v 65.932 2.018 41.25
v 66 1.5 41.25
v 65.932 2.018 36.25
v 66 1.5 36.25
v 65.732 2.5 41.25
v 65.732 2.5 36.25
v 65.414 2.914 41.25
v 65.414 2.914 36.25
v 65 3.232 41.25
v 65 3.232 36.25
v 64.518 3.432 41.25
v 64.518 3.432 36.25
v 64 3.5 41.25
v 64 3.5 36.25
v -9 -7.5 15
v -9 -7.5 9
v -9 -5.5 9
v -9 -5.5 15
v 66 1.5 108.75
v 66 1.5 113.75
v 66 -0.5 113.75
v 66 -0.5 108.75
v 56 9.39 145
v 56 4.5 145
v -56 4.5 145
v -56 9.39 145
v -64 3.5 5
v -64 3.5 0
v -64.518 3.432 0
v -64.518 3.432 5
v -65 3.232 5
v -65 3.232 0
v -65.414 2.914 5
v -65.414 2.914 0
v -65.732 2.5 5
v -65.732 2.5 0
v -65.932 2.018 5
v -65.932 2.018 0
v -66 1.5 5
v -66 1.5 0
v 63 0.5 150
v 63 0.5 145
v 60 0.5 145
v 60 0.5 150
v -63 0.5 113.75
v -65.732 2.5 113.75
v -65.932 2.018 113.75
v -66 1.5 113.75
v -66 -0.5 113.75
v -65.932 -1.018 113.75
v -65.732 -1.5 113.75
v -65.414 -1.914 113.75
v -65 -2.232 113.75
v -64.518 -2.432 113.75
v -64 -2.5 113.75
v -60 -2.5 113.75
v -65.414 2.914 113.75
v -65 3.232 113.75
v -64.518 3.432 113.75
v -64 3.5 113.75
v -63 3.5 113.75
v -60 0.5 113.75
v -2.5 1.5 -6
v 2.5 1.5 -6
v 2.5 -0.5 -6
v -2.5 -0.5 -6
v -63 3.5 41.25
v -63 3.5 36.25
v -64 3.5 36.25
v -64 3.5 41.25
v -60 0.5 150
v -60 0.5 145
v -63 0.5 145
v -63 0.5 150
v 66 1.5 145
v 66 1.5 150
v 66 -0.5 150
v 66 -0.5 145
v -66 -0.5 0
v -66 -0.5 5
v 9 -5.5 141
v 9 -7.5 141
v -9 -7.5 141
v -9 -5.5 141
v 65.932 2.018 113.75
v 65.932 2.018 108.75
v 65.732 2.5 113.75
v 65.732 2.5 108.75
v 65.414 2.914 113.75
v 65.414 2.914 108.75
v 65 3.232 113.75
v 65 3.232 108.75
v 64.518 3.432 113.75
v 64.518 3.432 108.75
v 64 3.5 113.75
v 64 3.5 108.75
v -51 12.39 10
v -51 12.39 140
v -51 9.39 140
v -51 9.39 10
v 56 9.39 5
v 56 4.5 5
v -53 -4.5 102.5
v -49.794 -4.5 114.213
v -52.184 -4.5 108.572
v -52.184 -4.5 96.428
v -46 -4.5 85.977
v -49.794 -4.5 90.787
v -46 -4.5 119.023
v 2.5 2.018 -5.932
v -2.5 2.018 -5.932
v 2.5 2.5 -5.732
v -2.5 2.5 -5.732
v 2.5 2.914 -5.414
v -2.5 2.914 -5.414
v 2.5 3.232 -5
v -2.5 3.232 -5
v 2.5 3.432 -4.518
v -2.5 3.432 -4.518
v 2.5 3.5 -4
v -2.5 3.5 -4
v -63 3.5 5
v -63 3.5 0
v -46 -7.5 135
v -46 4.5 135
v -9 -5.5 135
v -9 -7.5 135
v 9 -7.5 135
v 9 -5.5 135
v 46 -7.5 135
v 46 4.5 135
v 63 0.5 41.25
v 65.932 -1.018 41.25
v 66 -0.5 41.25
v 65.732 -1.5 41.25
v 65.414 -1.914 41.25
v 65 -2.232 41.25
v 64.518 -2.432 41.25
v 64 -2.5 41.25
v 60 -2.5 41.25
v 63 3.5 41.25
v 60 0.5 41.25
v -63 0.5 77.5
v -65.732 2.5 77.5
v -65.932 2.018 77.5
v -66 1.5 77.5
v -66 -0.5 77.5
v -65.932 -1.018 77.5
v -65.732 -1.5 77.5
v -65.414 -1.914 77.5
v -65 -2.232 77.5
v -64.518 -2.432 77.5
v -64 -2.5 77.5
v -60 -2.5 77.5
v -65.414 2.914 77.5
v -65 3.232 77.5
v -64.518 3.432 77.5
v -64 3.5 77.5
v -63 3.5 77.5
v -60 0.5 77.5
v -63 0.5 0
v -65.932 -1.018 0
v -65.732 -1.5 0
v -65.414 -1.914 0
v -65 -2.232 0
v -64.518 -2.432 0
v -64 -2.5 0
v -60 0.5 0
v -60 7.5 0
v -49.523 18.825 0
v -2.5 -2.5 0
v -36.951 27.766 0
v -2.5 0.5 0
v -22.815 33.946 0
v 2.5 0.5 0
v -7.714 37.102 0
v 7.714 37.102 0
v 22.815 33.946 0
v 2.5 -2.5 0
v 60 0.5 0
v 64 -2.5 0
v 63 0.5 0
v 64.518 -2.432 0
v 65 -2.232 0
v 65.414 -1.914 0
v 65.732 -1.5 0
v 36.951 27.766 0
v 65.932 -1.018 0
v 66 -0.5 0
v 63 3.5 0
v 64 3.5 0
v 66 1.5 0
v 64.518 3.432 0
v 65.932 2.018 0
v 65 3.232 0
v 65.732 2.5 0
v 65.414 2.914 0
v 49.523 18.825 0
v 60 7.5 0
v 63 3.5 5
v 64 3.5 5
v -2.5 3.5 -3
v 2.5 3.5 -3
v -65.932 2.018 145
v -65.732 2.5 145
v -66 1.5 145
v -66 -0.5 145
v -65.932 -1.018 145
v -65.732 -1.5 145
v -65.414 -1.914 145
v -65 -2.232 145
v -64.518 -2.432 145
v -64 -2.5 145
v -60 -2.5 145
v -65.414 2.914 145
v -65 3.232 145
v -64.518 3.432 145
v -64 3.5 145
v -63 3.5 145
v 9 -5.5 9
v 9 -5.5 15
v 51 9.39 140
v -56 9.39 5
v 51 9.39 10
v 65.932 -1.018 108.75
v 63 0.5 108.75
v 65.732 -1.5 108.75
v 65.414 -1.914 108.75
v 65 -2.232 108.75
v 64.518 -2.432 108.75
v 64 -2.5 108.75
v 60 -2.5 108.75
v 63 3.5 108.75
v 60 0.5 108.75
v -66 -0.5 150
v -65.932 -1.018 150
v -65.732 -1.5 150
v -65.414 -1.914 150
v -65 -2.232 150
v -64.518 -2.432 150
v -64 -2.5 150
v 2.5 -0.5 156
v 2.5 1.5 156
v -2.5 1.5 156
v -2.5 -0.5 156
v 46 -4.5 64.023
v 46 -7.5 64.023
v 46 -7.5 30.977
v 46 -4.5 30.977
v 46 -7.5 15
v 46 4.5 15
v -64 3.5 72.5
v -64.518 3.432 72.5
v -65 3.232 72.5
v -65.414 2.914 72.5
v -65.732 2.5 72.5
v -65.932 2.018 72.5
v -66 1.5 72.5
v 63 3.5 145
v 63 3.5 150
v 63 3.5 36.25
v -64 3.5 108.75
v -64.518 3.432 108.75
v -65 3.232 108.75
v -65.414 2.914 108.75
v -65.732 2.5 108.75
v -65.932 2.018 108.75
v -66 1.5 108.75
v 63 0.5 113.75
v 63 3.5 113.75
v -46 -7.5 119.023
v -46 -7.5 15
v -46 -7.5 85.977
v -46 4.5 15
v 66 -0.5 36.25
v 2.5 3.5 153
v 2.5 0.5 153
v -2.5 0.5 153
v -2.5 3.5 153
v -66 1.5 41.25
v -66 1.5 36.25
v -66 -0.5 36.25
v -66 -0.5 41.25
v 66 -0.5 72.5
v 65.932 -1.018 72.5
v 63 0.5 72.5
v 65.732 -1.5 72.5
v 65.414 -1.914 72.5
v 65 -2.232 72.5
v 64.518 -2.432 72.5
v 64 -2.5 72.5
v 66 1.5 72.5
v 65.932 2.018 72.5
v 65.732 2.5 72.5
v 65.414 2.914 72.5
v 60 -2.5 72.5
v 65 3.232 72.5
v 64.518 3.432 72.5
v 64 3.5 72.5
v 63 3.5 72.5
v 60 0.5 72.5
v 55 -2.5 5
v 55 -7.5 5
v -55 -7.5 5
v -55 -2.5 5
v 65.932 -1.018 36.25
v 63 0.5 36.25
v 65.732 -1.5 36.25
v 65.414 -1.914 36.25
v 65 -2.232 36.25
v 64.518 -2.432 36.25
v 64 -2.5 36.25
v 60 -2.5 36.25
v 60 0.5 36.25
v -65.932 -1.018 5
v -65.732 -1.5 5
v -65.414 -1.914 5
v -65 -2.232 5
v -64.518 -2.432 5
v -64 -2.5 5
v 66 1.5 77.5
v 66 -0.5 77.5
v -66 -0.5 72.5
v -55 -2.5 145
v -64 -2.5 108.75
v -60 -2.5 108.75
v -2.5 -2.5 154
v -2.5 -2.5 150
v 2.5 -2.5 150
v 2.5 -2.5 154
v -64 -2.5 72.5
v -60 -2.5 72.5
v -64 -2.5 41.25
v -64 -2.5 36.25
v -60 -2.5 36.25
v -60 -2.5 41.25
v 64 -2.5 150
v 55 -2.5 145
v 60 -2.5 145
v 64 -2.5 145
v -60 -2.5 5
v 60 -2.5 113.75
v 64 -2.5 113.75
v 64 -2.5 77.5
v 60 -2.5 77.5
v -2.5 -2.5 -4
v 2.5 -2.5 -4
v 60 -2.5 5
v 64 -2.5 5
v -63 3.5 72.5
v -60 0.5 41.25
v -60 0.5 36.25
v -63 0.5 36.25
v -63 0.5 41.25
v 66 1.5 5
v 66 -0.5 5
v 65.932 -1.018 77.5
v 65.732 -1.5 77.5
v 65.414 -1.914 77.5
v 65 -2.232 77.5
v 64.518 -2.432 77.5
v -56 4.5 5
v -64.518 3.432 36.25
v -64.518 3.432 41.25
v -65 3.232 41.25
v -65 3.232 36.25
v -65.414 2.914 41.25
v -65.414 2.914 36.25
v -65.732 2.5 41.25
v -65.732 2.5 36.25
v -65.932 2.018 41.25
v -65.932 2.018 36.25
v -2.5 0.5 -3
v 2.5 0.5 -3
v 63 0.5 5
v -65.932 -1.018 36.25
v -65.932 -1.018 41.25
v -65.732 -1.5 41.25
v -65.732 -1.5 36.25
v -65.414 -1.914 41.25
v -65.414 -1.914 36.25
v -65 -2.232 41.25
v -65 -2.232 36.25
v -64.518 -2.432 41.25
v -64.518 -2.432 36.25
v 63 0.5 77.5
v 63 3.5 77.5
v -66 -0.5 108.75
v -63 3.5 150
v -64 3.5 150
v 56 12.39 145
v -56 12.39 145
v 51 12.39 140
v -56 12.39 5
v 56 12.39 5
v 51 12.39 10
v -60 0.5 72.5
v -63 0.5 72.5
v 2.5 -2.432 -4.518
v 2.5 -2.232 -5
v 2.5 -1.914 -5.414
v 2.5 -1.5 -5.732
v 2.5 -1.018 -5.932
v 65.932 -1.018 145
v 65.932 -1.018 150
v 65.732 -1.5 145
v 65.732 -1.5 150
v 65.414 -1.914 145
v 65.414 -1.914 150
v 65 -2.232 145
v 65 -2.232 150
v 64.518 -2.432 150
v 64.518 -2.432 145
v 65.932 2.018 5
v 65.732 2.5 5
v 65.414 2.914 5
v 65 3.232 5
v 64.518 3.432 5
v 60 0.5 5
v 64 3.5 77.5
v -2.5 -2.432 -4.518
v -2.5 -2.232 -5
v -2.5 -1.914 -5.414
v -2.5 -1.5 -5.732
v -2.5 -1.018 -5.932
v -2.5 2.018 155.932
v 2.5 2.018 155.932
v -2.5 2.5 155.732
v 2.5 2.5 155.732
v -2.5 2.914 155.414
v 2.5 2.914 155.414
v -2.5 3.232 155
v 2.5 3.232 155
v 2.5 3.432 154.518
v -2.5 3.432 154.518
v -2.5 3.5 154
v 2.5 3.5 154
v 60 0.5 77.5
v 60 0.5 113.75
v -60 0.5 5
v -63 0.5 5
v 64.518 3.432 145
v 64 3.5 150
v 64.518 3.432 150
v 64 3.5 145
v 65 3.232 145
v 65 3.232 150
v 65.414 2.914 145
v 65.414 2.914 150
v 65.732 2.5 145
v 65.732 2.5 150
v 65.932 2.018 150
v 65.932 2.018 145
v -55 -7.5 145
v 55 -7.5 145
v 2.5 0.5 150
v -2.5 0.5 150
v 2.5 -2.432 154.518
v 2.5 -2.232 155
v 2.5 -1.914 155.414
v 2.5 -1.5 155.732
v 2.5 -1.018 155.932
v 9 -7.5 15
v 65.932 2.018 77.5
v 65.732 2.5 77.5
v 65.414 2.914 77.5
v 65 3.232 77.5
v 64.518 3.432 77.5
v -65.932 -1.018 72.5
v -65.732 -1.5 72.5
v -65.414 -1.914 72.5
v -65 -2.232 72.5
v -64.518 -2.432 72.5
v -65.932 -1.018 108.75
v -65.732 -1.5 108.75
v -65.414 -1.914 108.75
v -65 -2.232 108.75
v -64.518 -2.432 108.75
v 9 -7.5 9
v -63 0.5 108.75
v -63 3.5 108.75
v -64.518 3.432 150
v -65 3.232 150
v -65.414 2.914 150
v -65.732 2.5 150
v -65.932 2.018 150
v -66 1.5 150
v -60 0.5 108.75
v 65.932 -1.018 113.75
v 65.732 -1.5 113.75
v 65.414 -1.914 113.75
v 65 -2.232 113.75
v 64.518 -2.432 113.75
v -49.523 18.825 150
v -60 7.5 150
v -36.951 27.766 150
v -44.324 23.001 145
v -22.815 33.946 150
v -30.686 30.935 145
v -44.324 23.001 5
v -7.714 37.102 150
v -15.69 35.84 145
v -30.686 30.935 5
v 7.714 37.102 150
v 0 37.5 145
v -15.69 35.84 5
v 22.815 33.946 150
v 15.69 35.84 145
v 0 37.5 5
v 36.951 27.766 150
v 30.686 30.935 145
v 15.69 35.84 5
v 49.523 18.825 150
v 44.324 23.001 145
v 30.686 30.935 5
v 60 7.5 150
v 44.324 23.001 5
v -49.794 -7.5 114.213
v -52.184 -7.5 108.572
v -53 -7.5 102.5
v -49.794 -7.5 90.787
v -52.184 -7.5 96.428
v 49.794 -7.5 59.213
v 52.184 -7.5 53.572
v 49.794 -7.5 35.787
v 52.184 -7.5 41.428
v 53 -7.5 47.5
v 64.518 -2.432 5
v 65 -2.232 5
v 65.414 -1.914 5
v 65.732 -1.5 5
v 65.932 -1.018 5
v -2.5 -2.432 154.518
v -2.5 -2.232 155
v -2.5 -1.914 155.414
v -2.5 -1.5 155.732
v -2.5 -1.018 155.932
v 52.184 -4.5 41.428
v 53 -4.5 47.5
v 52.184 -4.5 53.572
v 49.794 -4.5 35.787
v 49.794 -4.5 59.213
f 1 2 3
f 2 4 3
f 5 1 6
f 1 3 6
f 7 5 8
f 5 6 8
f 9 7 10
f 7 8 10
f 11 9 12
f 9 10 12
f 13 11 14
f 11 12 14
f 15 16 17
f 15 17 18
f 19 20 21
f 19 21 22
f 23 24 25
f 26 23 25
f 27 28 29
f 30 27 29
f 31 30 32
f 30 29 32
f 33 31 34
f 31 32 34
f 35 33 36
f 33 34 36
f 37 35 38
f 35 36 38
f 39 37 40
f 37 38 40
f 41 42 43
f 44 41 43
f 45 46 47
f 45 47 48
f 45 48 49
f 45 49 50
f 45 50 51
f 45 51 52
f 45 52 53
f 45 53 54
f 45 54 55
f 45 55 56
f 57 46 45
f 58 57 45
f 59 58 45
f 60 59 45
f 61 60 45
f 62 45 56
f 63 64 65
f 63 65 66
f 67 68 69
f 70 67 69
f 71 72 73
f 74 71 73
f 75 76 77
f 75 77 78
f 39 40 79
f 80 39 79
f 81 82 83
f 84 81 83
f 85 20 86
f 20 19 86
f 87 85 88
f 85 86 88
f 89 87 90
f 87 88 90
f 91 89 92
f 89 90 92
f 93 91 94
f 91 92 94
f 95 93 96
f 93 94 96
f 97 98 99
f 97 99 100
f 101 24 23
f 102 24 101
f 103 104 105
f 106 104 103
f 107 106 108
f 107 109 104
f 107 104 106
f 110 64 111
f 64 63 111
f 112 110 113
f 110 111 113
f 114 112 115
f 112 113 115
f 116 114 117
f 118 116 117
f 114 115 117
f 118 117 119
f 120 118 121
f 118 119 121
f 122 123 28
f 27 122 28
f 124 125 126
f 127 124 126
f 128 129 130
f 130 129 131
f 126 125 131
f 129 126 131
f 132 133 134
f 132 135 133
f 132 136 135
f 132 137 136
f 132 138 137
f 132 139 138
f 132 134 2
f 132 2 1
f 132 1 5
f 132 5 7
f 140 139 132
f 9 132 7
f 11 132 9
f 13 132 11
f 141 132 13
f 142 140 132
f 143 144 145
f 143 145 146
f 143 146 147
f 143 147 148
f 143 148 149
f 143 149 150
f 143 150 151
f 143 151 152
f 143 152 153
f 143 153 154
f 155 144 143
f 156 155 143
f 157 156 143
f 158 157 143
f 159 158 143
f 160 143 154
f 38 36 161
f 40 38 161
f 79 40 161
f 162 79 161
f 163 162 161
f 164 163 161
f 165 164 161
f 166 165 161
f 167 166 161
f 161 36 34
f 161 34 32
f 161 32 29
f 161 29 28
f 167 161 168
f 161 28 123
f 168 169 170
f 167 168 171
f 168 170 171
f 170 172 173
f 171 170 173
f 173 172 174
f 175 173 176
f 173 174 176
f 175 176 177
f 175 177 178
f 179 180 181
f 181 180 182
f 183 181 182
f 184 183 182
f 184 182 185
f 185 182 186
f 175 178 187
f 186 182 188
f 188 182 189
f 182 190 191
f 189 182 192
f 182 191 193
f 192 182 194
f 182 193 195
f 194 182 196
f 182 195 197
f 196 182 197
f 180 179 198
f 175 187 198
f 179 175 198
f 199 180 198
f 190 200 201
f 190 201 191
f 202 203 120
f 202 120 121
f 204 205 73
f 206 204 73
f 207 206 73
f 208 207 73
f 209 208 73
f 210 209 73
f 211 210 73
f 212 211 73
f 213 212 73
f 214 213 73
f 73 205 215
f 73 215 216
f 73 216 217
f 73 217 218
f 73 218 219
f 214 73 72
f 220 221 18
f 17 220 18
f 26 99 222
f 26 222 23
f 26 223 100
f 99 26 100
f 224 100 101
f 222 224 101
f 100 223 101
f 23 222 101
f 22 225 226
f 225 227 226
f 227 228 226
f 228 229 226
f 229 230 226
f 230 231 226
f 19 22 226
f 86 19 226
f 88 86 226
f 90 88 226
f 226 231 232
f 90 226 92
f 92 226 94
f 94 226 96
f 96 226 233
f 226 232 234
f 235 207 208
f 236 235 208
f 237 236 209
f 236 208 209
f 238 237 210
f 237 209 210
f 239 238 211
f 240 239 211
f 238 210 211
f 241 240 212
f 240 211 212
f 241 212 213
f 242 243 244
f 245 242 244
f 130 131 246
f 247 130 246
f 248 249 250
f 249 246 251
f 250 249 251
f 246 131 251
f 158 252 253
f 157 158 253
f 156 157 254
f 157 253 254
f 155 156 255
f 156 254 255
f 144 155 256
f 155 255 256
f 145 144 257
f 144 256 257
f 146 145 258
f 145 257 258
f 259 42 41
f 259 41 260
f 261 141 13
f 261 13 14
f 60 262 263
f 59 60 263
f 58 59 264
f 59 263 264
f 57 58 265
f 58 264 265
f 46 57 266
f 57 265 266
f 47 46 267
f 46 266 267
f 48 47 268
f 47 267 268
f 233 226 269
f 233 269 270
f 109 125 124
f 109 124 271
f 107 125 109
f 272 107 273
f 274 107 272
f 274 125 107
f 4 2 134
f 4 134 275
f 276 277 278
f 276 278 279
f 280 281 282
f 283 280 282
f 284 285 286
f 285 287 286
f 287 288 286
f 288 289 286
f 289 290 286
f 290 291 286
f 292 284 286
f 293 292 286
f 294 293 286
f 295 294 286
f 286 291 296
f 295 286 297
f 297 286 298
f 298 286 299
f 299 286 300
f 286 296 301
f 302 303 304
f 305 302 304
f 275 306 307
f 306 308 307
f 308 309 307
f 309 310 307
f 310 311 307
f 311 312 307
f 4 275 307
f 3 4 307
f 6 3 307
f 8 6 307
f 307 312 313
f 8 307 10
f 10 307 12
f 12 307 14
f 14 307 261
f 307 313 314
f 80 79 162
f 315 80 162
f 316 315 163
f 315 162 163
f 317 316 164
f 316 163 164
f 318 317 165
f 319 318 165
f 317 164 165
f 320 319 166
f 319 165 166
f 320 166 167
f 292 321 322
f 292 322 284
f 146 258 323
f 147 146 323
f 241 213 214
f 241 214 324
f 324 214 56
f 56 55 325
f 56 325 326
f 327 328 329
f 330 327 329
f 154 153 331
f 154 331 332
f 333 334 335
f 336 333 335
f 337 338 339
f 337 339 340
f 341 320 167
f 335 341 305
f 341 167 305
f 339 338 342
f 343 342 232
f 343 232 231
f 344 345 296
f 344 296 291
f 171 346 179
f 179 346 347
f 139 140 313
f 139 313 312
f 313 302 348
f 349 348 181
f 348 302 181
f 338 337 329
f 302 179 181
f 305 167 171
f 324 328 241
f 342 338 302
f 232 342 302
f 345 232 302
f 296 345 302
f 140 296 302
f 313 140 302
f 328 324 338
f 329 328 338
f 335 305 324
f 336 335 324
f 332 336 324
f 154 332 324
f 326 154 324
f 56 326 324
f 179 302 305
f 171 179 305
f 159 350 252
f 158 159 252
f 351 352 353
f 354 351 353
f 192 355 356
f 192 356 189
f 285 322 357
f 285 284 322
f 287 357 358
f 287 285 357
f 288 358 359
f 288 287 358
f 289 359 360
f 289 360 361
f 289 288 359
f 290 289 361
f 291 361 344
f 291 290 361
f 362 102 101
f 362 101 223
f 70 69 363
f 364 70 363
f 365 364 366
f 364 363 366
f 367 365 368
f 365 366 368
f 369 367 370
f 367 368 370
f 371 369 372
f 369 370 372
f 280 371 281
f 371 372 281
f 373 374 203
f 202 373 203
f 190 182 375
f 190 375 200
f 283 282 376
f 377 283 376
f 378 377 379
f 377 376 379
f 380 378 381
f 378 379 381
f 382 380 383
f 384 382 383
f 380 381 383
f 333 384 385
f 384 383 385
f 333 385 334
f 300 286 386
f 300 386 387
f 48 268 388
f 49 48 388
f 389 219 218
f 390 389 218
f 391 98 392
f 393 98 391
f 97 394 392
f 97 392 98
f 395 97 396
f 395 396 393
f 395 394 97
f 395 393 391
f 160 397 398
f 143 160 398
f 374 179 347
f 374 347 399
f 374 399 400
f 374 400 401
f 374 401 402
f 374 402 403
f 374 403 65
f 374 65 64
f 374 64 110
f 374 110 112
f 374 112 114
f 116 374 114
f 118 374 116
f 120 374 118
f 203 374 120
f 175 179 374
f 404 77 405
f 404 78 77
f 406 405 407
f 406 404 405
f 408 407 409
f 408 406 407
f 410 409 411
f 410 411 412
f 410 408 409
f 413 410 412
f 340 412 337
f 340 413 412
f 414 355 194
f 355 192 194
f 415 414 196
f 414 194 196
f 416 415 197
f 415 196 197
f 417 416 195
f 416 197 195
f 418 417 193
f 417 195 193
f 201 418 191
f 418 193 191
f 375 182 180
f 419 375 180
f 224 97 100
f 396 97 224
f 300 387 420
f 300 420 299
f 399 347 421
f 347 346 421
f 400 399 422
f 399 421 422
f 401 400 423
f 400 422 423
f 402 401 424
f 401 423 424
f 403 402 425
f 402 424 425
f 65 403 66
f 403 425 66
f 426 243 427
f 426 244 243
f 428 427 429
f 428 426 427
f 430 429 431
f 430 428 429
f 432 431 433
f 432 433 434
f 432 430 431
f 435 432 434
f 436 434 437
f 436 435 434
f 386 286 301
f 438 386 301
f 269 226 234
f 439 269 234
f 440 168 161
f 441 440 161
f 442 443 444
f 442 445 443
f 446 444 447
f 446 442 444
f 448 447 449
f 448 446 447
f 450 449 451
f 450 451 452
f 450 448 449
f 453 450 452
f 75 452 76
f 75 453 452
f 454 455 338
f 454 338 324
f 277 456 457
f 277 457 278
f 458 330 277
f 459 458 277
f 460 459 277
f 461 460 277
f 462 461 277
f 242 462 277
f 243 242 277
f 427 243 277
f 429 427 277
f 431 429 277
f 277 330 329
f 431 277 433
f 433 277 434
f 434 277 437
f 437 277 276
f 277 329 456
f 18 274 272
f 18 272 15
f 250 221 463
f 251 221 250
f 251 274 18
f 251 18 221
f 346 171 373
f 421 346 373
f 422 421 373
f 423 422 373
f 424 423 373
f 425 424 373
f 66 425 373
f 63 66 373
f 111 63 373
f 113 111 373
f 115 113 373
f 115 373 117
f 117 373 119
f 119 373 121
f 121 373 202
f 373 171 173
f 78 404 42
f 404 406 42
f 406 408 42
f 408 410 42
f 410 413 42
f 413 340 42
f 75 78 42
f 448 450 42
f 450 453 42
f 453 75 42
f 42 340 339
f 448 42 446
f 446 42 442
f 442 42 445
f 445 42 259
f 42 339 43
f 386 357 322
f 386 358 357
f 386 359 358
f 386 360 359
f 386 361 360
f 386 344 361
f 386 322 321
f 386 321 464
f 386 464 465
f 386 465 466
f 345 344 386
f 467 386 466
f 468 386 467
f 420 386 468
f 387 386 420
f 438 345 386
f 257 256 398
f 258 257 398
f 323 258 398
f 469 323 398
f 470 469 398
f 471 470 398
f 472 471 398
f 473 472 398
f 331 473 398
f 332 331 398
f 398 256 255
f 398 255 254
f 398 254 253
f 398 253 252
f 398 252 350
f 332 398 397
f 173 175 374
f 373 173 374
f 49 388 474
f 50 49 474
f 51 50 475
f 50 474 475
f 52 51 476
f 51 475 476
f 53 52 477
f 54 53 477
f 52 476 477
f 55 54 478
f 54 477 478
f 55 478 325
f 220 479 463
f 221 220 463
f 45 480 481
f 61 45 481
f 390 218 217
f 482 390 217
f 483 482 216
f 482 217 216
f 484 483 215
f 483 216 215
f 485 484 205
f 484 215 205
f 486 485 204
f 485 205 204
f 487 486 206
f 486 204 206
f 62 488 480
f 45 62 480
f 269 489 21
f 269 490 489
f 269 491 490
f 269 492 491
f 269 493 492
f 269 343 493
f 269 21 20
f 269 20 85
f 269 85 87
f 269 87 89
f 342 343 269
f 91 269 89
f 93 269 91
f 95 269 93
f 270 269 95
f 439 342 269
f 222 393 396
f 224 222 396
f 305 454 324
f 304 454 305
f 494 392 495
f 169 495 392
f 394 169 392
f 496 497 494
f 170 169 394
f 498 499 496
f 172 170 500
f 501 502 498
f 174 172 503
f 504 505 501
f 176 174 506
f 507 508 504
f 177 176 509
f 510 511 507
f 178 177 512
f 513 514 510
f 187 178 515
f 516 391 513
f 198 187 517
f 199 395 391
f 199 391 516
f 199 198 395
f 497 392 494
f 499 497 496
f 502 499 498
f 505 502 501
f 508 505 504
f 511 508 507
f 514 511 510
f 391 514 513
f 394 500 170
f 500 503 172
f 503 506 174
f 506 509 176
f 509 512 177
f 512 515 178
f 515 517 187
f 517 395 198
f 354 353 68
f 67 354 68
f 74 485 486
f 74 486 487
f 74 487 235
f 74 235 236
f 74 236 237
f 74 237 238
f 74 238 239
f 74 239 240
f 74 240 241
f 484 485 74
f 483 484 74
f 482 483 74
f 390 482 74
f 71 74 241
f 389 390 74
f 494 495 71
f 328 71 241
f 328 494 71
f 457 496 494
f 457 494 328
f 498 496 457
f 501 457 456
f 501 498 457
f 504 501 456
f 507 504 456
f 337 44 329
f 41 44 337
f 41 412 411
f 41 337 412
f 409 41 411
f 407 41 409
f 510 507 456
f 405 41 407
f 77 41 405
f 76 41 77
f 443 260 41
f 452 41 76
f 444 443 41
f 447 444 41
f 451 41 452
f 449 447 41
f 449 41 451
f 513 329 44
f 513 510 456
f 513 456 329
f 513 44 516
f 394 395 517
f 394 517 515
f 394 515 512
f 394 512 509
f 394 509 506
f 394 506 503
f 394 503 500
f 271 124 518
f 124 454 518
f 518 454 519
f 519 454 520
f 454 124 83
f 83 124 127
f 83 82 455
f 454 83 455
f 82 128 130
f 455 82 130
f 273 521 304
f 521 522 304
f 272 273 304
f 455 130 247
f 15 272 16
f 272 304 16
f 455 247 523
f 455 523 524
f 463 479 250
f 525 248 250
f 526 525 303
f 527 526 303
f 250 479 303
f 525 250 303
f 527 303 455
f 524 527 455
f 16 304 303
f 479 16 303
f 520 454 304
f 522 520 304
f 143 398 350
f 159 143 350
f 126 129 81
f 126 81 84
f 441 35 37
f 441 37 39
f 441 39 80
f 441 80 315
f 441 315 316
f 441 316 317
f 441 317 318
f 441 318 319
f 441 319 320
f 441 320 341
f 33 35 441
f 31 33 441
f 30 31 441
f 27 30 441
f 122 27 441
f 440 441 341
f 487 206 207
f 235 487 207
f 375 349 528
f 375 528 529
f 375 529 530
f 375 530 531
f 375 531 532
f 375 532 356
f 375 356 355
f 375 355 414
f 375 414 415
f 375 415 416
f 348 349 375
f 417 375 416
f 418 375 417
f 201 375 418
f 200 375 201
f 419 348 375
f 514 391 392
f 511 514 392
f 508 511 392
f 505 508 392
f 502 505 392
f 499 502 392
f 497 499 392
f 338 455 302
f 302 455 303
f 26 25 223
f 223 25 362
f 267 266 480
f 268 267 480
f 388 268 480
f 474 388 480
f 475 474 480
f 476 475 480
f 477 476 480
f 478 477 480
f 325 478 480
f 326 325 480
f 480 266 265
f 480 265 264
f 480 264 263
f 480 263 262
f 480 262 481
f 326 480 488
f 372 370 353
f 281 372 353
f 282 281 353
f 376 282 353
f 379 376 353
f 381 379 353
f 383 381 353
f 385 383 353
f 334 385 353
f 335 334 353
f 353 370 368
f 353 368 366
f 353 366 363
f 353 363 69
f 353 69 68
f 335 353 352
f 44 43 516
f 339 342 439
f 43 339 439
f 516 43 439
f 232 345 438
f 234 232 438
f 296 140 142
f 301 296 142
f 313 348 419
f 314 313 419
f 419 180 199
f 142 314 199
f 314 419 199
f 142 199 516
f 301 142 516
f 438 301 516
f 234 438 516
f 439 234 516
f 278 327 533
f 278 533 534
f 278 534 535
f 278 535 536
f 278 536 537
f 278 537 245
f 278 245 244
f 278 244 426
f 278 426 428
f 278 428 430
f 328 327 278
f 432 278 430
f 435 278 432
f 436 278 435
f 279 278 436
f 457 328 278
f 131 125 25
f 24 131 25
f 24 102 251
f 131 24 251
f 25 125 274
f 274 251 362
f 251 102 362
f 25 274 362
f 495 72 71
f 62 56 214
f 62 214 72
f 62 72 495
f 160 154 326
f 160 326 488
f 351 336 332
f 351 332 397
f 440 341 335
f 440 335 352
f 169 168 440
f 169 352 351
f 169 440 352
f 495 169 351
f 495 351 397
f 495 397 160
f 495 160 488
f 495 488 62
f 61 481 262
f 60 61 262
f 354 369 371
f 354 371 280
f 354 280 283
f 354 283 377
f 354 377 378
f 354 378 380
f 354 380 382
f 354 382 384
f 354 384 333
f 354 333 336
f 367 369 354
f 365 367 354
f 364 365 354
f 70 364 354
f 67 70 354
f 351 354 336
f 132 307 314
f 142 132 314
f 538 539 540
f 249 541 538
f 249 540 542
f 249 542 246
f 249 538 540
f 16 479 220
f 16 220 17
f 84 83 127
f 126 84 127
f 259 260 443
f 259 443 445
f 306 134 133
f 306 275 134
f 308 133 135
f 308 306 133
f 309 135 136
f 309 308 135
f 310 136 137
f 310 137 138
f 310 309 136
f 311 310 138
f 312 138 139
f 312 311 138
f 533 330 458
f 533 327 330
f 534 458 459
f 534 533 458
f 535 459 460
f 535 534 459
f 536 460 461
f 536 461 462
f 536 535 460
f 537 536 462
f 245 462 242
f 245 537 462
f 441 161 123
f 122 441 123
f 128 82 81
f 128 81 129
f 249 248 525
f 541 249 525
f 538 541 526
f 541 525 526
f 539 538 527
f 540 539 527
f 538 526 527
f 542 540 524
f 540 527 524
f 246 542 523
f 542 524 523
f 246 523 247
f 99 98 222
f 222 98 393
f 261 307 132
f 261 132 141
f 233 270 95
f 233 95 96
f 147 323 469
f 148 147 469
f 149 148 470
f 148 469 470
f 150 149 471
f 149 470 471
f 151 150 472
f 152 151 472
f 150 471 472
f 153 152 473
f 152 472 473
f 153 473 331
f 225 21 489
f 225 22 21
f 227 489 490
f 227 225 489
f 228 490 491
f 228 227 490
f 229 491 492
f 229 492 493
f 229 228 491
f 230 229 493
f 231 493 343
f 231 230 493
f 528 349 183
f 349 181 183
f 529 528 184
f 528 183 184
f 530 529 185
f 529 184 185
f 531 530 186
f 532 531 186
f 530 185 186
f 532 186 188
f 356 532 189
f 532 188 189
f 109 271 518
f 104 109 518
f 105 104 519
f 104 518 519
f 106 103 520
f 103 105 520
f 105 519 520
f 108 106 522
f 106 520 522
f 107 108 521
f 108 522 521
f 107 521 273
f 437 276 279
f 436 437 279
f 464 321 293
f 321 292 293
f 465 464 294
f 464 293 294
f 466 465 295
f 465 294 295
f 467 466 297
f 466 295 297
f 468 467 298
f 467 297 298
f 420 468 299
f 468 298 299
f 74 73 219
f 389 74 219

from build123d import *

# Parameters (mm, degrees)
SKETCH2_W              = 120
SKETCH2_H              = 15
BOSS_EXTRUDE1_DEPTH    = 150
BOSS_EXTRUDE3_DEPTH    = 150
SKETCH7_W              = 112
SKETCH7_H              = 140
CUT_EXTRUDE1_DEPTH     = 165.890873004
SKETCH8_W              = 92
SKETCH8_H              = 120
CUT_EXTRUDE2_DEPTH     = 165.890873004
SKETCH12_OUTSIDE_W     = 161.458
SKETCH12_OUTSIDE_H     = 191.458
SKETCH12_OUTSIDE_W_2   = 110
SKETCH12_OUTSIDE_H_2   = 140
CUT_EXTRUDE5_DEPTH     = 5
BOSS_EXTRUDE4_REACH    = 163.342
SKETCH14_W             = 112
SKETCH14_H             = 3
CUT_EXTRUDE6_REACH     = 165.495
SKETCH15_W             = 102
SKETCH15_H             = 130
SKETCH16_W             = 5
SKETCH16_H             = 6
BOSS_EXTRUDE5_DEPTH    = 6
CUT_EXTRUDE7_REACH     = 170.114
SKETCH17_W             = 3
SKETCH17_H             = 3
FILLET1_R              = 2
LPATTERN1_COUNT        = 5
LPATTERN1_PITCH        = 36.25
FILLET1_OF_LPATTERN1_R = 2
MIRROR1_DEPTH          = 5
MIRROR1_START          = 36.25
MIRROR1_2_DEPTH        = 5
MIRROR1_START_2        = 72.5
MIRROR1_3_DEPTH        = 5
MIRROR1_START_3        = 108.75
MIRROR1_4_DEPTH        = 5
MIRROR1_START_4        = 145
MIRROR1_5_DEPTH        = 5
SKETCH18_W             = 5
SKETCH18_H             = 6
BOSS_EXTRUDE6_DEPTH    = 6
CUT_EXTRUDE8_REACH     = 171.111
SKETCH19_W             = 3
SKETCH19_H             = 3
FILLET2_R              = 2
FILLET2_OF_MIRROR2_R   = 2
SKETCH20_R             = 23
CUT_EXTRUDE9_DEPTH     = 3
SKETCH21_W             = 18
SKETCH21_H             = 6
CUT_EXTRUDE10_DEPTH    = 2


# Read off the part's stored shape, not the designer's step: Mirror1
with BuildPart() as part:
    # Sketch2 → Boss-Extrude1 (new body)
    with BuildSketch(Plane.XY):
        Rectangle(SKETCH2_W, SKETCH2_H)
    extrude(amount=BOSS_EXTRUDE1_DEPTH)

    # Sketch4 → Boss-Extrude3 (add)
    with BuildSketch(Plane(origin=(0, 0, 0), x_dir=(-1, 0, 0), z_dir=(0, 0, -1))):
        with BuildLine():
            Line((-60, 7.5), (60, 7.5))
            ThreePointArc((60, 7.5), (0, 37.5), (-60, 7.5))
        make_face()
    extrude(amount=-BOSS_EXTRUDE3_DEPTH)

    # Sketch7 → Cut-Extrude1 (cut, through all)
    with BuildSketch(Plane(origin=(0, 4.5, 0), x_dir=(-1, 0, 0), z_dir=(0, -1, 0))):
        with Locations((0, -75)):
            Rectangle(SKETCH7_W, SKETCH7_H)
    extrude(amount=-CUT_EXTRUDE1_DEPTH, mode=Mode.SUBTRACT)

    # Sketch8 → Cut-Extrude2 (cut, through all)
    with BuildSketch(Plane(origin=(0, 4.5, 0), x_dir=(1, 0, 0), z_dir=(0, 1, 0))):
        with Locations((0, -75)):
            Rectangle(SKETCH8_W, SKETCH8_H)
    extrude(amount=-CUT_EXTRUDE2_DEPTH, mode=Mode.SUBTRACT)

    # Sketch12 outside → Cut-Extrude5 (cut)
    with BuildSketch(Plane(origin=(0, -7.5, 0), x_dir=(-1, 0, 0), z_dir=(0, -1, 0))):
        with Locations((0, -75)):
            Rectangle(SKETCH12_OUTSIDE_W, SKETCH12_OUTSIDE_H)
        with Locations((0, -75)):
            Rectangle(SKETCH12_OUTSIDE_W_2, SKETCH12_OUTSIDE_H_2, mode=Mode.SUBTRACT)
    extrude(amount=-CUT_EXTRUDE5_DEPTH, mode=Mode.SUBTRACT)

    # Sketch14 → Boss-Extrude4 (add, up to next)
    with BuildSketch(Plane.XY.offset(5), mode=Mode.PRIVATE) as boss_extrude4_sk1:
        with Locations((0, 10.889878733)):
            Rectangle(SKETCH14_W, SKETCH14_H)
    boss_extrude4_tool1 = extrude(boss_extrude4_sk1.sketch, amount=BOSS_EXTRUDE4_REACH, mode=Mode.PRIVATE) - part.part
    add(boss_extrude4_tool1.solids().sort_by_distance((0, 10.889879, 5))[0])

    # Sketch15 → Cut-Extrude6 (cut, up to next)
    with BuildSketch(Plane(origin=(0, 12.389878733, 0), x_dir=(1, 0, 0), z_dir=(0, 1, 0)), mode=Mode.PRIVATE) as cut_extrude6_sk1:
        with Locations((0, -75)):
            Rectangle(SKETCH15_W, SKETCH15_H)
    cut_extrude6_tool1 = extrude(cut_extrude6_sk1.sketch, amount=-CUT_EXTRUDE6_REACH, mode=Mode.PRIVATE) & part.part
    add(cut_extrude6_tool1.solids().sort_by_distance((0, 12.389879, 75))[0], mode=Mode.SUBTRACT)

    # Sketch16 → Boss-Extrude5 (add)
    with BuildSketch(Plane(origin=(60, 0, 0), x_dir=(0, 0, -1), z_dir=(1, 0, 0))):
        with Locations((-2.5, 0.5)):
            Rectangle(SKETCH16_W, SKETCH16_H)
    boss_extrude5 = extrude(amount=BOSS_EXTRUDE5_DEPTH)

    # Sketch17 → Cut-Extrude7 (cut, up to next)
    with BuildSketch(Plane(origin=(0, 0, 0), x_dir=(-1, 0, 0), z_dir=(0, 0, -1)), mode=Mode.PRIVATE) as cut_extrude7_sk1:
        with Locations((-61.5, 2)):
            Rectangle(SKETCH17_W, SKETCH17_H)
    cut_extrude7_tool1 = extrude(cut_extrude7_sk1.sketch, amount=-CUT_EXTRUDE7_REACH, mode=Mode.PRIVATE) & part.part
    cut_extrude7 = cut_extrude7_tool1.solids().sort_by_distance((61.5, 2, 0))[0]
    add(cut_extrude7, mode=Mode.SUBTRACT)

    # Fillet1
    fillet1_edges = [part.edges().sort_by_distance(p)[0] for p in [
        (66, 3.5, 2.5),
        (66, -2.5, 2.5),
    ]]
    fillet(fillet1_edges, radius=FILLET1_R)

    # LPattern1: Boss-Extrude5, Cut-Extrude7 ×5
    with Locations(*[(0, 0, i * LPATTERN1_PITCH) for i in range(1, LPATTERN1_COUNT)]):
        add(boss_extrude5)
        add(cut_extrude7, mode=Mode.SUBTRACT)

    # Fillet1 of LPattern1
    fillet1_of_lpattern1_edges = [part.edges().sort_by_distance(p)[0] for p in [
        (66, 3.5, 38.75),
        (66, -2.5, 38.75),
        (66, 3.5, 75),
        (66, -2.5, 75),
        (66, 3.5, 111.25),
        (66, -2.5, 111.25),
        (66, 3.5, 147.5),
        (66, -2.5, 147.5),
    ]]
    fillet(fillet1_of_lpattern1_edges, radius=FILLET1_OF_LPATTERN1_R)

    # Mirror1 outline → Mirror1 (add)
    with BuildSketch(Plane.XY):
        with BuildLine():
            Line((-63, 0.5), (-63, 3.5))
            Line((-63, 3.5), (-64, 3.5))
            ThreePointArc((-64, 3.5), (-65.414213562, 2.914213562), (-66, 1.5))
            Line((-66, 1.5), (-66, -0.5))
            ThreePointArc((-66, -0.5), (-65.414213562, -1.914213562), (-64, -2.5))
            Line((-64, -2.5), (-60, -2.5))
            Line((-60, -2.5), (-60, 0.5))
            Line((-60, 0.5), (-63, 0.5))
        make_face()
    extrude(amount=MIRROR1_DEPTH)

    # Mirror1 2 outline → Mirror1 2 (add)
    with BuildSketch(Plane.XY.offset(MIRROR1_START)):
        with BuildLine():
            Line((-63, 0.5), (-63, 3.5))
            Line((-63, 3.5), (-64, 3.5))
            ThreePointArc((-64, 3.5), (-65.414213562, 2.914213562), (-66, 1.5))
            Line((-66, 1.5), (-66, -0.5))
            ThreePointArc((-66, -0.5), (-65.414213562, -1.914213562), (-64, -2.5))
            Line((-64, -2.5), (-60, -2.5))
            Line((-60, -2.5), (-60, 0.5))
            Line((-60, 0.5), (-63, 0.5))
        make_face()
    extrude(amount=MIRROR1_2_DEPTH)

    # Mirror1 3 outline → Mirror1 3 (add)
    with BuildSketch(Plane.XY.offset(MIRROR1_START_2)):
        with BuildLine():
            Line((-63, 0.5), (-63, 3.5))
            Line((-63, 3.5), (-64, 3.5))
            ThreePointArc((-64, 3.5), (-65.414213562, 2.914213562), (-66, 1.5))
            Line((-66, 1.5), (-66, -0.5))
            ThreePointArc((-66, -0.5), (-65.414213562, -1.914213562), (-64, -2.5))
            Line((-64, -2.5), (-60, -2.5))
            Line((-60, -2.5), (-60, 0.5))
            Line((-60, 0.5), (-63, 0.5))
        make_face()
    extrude(amount=MIRROR1_3_DEPTH)

    # Mirror1 4 outline → Mirror1 4 (add)
    with BuildSketch(Plane.XY.offset(MIRROR1_START_3)):
        with BuildLine():
            Line((-63, 0.5), (-63, 3.5))
            Line((-63, 3.5), (-64, 3.5))
            ThreePointArc((-64, 3.5), (-65.414213562, 2.914213562), (-66, 1.5))
            Line((-66, 1.5), (-66, -0.5))
            ThreePointArc((-66, -0.5), (-65.414213562, -1.914213562), (-64, -2.5))
            Line((-64, -2.5), (-60, -2.5))
            Line((-60, -2.5), (-60, 0.5))
            Line((-60, 0.5), (-63, 0.5))
        make_face()
    extrude(amount=MIRROR1_4_DEPTH)

    # Mirror1 5 outline → Mirror1 5 (add)
    with BuildSketch(Plane.XY.offset(MIRROR1_START_4)):
        with BuildLine():
            Line((-63, 0.5), (-63, 3.5))
            Line((-63, 3.5), (-64, 3.5))
            ThreePointArc((-64, 3.5), (-65.414213562, 2.914213562), (-66, 1.5))
            Line((-66, 1.5), (-66, -0.5))
            ThreePointArc((-66, -0.5), (-65.414213562, -1.914213562), (-64, -2.5))
            Line((-64, -2.5), (-60, -2.5))
            Line((-60, -2.5), (-60, 0.5))
            Line((-60, 0.5), (-63, 0.5))
        make_face()
    extrude(amount=MIRROR1_5_DEPTH)

    # Sketch18 → Boss-Extrude6 (add)
    with BuildSketch(Plane(origin=(0, 0, 0), x_dir=(-1, 0, 0), z_dir=(0, 0, -1))):
        with Locations((0, 0.5)):
            Rectangle(SKETCH18_W, SKETCH18_H)
    boss_extrude6 = extrude(amount=BOSS_EXTRUDE6_DEPTH)

    # Sketch19 → Cut-Extrude8 (cut, up to next)
    with BuildSketch(Plane(origin=(2.5, 0, 0), x_dir=(0, 0, -1), z_dir=(1, 0, 0)), mode=Mode.PRIVATE) as cut_extrude8_sk1:
        with Locations((1.5, 2)):
            Rectangle(SKETCH19_W, SKETCH19_H)
    cut_extrude8_tool1 = extrude(cut_extrude8_sk1.sketch, amount=-CUT_EXTRUDE8_REACH, mode=Mode.PRIVATE) & part.part
    cut_extrude8 = cut_extrude8_tool1.solids().sort_by_distance((2.5, 2, -1.5))[0]
    add(cut_extrude8, mode=Mode.SUBTRACT)

    # Fillet2
    fillet2_edges = [part.edges().sort_by_distance(p)[0] for p in [
        (0, -2.5, -6),
        (0, 3.5, -6),
    ]]
    fillet(fillet2_edges, radius=FILLET2_R)

    # Mirror2: Boss-Extrude6, Cut-Extrude8 across plane
    add(boss_extrude6.mirror(Plane.XY.offset(75)))
    add(cut_extrude8.mirror(Plane.XY.offset(75)), mode=Mode.SUBTRACT)

    # Fillet2 of Mirror2
    fillet2_of_mirror2_edges = [part.edges().sort_by_distance(p)[0] for p in [
        (0, -2.5, 156),
        (0, 3.5, 156),
    ]]
    fillet(fillet2_of_mirror2_edges, radius=FILLET2_OF_MIRROR2_R)

    # Sketch20 → Cut-Extrude9 (cut)
    with BuildSketch(Plane(origin=(0, -7.5, 0), x_dir=(-1, 0, 0), z_dir=(0, -1, 0))):
        with Locations((30, -102.5)):
            Circle(SKETCH20_R)
        with Locations((-30, -47.5)):
            Circle(SKETCH20_R)
    extrude(amount=-CUT_EXTRUDE9_DEPTH, mode=Mode.SUBTRACT)

    # Sketch21 → Cut-Extrude10 (cut)
    with BuildSketch(Plane(origin=(0, -7.5, 0), x_dir=(-1, 0, 0), z_dir=(0, -1, 0))):
        with Locations((0, -138)):
            Rectangle(SKETCH21_W, SKETCH21_H)
    cut_extrude10 = extrude(amount=-CUT_EXTRUDE10_DEPTH, mode=Mode.SUBTRACT)

    # Mirror3: Cut-Extrude10 across plane
    add(cut_extrude10.mirror(Plane.XY.offset(75)), mode=Mode.SUBTRACT)


solid = part.part
